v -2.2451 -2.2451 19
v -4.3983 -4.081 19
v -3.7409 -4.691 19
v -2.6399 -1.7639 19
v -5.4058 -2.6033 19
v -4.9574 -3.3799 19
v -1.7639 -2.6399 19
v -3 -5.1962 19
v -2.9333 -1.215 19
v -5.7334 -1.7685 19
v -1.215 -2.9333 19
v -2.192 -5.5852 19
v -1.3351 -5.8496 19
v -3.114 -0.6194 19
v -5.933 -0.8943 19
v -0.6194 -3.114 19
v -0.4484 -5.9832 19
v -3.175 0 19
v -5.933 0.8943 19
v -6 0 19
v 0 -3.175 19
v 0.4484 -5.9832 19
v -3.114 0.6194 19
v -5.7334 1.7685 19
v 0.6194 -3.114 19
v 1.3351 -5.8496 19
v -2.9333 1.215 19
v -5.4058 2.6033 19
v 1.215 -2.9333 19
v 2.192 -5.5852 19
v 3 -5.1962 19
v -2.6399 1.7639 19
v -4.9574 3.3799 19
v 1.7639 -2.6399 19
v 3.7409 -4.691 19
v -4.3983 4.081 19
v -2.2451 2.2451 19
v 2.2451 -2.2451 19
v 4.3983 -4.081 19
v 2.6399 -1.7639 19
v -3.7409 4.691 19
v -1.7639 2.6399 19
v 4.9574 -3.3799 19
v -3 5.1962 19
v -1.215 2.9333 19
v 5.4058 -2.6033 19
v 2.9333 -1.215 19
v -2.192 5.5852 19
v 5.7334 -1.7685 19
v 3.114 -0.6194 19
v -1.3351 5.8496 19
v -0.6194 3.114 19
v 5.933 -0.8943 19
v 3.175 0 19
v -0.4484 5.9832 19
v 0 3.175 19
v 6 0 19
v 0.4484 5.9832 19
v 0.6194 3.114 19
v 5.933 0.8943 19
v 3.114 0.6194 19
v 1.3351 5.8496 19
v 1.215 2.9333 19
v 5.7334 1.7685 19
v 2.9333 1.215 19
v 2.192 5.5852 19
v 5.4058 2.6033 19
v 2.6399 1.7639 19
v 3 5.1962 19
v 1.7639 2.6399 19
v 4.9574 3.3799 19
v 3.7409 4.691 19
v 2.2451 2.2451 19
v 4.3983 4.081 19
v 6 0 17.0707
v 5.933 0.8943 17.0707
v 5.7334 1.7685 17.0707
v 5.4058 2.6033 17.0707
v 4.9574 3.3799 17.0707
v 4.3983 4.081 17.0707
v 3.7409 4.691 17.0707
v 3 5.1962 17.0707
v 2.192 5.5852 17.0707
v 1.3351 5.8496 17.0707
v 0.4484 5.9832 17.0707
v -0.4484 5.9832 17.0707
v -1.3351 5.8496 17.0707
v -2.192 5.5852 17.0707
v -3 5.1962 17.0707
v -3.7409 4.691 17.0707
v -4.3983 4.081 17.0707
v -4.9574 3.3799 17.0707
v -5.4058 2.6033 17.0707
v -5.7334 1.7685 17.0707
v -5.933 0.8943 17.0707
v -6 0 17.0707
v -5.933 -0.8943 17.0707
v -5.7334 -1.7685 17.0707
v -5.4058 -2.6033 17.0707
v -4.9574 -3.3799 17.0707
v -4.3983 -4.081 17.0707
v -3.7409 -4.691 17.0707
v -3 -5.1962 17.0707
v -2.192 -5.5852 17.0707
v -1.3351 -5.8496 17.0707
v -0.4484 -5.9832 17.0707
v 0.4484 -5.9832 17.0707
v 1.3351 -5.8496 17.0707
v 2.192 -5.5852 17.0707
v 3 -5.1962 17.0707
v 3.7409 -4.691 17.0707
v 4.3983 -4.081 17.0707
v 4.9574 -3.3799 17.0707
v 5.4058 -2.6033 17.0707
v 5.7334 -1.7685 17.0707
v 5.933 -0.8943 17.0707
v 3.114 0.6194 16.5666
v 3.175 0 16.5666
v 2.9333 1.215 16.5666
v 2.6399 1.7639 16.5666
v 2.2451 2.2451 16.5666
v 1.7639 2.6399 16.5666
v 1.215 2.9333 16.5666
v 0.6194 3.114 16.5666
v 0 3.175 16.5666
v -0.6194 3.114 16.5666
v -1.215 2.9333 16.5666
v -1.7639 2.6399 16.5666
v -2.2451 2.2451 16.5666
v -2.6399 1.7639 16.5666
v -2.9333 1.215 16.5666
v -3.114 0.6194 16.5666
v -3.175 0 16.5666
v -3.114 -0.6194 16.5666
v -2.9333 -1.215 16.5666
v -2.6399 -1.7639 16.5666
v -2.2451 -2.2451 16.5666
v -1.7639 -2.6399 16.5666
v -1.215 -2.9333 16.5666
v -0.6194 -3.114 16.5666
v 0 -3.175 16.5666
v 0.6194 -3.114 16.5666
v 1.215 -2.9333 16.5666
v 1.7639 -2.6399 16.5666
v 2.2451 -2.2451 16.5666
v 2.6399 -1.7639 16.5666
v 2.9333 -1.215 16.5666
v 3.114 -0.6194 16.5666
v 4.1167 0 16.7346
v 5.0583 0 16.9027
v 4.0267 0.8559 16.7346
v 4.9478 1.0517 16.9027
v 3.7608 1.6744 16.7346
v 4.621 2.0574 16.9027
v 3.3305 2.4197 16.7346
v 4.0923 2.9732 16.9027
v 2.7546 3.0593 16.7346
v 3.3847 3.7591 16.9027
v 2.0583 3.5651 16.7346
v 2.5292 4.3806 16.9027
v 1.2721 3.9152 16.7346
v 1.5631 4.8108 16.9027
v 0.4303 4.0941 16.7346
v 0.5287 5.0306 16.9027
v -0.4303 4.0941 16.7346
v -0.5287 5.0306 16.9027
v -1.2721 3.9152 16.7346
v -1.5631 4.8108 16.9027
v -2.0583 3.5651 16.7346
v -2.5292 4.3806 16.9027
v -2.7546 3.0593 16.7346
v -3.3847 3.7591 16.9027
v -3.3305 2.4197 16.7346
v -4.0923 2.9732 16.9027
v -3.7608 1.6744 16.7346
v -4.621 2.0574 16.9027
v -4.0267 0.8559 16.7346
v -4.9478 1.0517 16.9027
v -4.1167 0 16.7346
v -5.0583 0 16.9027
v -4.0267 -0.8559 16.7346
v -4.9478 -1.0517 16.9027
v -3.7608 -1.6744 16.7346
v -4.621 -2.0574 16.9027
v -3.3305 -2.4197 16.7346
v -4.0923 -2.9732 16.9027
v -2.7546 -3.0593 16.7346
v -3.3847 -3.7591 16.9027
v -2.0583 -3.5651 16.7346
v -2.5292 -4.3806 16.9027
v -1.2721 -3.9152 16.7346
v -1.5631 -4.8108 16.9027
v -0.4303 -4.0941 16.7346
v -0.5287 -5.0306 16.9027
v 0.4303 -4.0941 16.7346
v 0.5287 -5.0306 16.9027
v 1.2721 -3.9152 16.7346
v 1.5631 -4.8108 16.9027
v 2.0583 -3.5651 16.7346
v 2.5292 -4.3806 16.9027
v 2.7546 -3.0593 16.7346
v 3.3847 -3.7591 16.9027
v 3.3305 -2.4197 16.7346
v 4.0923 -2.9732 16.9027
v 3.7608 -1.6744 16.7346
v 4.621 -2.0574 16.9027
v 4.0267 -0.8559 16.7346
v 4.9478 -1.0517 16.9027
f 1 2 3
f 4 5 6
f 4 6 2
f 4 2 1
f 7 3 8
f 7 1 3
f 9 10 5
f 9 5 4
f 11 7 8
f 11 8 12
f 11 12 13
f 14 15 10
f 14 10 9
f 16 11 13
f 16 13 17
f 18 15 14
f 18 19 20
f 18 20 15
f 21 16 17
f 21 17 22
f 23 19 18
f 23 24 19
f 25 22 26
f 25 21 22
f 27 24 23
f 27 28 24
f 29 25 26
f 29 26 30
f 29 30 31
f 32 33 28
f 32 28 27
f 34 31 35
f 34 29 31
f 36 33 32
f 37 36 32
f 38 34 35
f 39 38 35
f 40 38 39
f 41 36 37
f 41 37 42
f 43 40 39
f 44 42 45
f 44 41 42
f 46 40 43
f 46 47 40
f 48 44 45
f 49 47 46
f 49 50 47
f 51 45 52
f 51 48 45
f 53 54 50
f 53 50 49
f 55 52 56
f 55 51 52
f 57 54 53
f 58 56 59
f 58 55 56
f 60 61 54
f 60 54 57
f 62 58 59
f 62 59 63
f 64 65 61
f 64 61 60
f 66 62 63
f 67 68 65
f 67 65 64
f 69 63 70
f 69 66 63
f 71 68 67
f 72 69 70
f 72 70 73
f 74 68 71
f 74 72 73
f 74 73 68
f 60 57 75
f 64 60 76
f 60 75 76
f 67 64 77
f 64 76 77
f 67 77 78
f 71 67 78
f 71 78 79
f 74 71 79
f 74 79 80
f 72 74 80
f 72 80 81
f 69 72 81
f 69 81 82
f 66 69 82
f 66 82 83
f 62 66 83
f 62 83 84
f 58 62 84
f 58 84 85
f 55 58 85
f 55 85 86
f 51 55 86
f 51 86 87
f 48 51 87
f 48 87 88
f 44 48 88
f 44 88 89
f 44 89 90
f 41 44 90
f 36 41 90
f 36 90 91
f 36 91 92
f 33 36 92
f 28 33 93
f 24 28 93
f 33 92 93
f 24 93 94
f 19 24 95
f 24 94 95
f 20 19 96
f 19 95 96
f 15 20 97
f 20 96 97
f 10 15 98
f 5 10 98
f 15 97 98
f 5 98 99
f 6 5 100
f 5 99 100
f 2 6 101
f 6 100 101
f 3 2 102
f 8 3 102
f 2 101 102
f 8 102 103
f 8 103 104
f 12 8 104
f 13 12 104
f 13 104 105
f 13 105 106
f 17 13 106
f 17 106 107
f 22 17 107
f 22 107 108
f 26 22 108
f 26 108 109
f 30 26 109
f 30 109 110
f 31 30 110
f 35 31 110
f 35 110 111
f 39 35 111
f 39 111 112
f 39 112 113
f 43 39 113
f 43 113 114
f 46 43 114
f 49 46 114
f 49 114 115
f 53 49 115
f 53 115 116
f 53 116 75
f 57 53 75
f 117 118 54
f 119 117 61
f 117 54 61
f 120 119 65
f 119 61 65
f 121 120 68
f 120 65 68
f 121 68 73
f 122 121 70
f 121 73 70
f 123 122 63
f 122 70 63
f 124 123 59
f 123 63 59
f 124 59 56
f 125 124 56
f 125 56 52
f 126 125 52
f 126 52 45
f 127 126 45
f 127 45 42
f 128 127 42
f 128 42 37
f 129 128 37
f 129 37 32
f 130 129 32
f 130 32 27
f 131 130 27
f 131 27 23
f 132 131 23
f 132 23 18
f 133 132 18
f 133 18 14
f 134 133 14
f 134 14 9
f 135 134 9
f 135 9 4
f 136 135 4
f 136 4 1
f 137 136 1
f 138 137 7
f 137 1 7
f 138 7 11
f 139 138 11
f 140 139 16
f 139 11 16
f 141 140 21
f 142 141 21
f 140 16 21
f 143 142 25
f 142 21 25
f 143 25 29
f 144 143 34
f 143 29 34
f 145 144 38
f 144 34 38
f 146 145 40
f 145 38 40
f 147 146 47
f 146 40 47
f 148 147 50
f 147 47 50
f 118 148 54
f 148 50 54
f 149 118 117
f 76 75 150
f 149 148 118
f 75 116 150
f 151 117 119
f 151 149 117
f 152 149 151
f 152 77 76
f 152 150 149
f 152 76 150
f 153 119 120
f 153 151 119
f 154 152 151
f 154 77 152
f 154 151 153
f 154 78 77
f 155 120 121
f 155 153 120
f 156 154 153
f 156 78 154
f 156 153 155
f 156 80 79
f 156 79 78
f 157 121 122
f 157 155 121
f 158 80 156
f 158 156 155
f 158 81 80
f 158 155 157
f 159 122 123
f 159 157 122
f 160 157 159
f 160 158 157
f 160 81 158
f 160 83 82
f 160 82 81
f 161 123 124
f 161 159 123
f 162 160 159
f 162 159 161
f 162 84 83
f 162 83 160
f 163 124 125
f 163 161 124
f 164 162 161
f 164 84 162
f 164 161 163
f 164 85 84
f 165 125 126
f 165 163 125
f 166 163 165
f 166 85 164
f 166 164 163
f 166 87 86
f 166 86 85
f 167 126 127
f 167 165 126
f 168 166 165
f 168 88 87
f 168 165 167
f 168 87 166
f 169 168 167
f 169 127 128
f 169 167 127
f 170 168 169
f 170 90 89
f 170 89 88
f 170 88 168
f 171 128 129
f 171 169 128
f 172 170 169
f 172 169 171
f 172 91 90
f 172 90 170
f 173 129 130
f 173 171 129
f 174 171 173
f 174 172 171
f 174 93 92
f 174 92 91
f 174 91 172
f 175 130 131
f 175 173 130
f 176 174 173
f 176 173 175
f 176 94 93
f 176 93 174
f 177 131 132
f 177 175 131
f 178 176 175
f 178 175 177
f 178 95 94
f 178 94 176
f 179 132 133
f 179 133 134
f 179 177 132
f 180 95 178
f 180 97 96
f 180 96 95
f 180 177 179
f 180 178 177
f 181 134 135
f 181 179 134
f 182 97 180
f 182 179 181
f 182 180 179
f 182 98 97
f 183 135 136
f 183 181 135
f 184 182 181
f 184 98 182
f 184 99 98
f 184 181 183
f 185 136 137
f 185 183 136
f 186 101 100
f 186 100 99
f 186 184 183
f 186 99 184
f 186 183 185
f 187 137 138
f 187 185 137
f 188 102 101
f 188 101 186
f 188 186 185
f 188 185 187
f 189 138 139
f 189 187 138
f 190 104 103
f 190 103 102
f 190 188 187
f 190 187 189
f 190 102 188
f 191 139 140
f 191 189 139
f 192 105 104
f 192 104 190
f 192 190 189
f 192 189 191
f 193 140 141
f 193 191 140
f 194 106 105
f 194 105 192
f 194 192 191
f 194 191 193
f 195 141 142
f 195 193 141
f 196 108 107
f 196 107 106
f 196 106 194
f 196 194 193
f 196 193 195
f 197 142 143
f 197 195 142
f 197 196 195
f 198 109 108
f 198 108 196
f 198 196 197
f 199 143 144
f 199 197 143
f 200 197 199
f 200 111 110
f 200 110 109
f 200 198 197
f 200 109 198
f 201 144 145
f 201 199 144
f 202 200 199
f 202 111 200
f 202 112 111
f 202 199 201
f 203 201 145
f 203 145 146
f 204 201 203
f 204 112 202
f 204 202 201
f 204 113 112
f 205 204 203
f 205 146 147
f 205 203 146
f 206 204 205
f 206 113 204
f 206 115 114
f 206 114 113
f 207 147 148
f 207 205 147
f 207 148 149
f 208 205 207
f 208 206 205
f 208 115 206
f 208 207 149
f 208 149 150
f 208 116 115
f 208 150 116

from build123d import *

# Parameters (mm, degrees)
SKETCH043_R     = 6
PAD021_DEPTH    = 3
SKETCH044_R     = 3.175
POCKET021_DEPTH = 3.001


with BuildPart() as part:
    # Sketch043 → Pad021 (new body)
    with BuildSketch(Plane.XY):
        Circle(SKETCH043_R)
    extrude(amount=PAD021_DEPTH)

    # Sketch044 (on Face3 of Pad021) → Pocket021 (cut, through all)
    with BuildSketch(Plane.XY.offset(3)):
        Circle(SKETCH044_R)
    extrude(amount=-POCKET021_DEPTH, mode=Mode.SUBTRACT)

    # Sketch045 → Groove001 (revolve, cut)
    with BuildSketch(Plane.XZ):
        Polygon((0, 0), (12.888196, 2.299908), (13.181708, 0), align=None)
    revolve(axis=Axis((0, 0, 0), (0, 0, 1)), mode=Mode.SUBTRACT)


with BuildPart() as part_1:
    # Body010 placement: moved
    add(part.part.moved(Location((0, 0, 16))))


solid = part_1.part
